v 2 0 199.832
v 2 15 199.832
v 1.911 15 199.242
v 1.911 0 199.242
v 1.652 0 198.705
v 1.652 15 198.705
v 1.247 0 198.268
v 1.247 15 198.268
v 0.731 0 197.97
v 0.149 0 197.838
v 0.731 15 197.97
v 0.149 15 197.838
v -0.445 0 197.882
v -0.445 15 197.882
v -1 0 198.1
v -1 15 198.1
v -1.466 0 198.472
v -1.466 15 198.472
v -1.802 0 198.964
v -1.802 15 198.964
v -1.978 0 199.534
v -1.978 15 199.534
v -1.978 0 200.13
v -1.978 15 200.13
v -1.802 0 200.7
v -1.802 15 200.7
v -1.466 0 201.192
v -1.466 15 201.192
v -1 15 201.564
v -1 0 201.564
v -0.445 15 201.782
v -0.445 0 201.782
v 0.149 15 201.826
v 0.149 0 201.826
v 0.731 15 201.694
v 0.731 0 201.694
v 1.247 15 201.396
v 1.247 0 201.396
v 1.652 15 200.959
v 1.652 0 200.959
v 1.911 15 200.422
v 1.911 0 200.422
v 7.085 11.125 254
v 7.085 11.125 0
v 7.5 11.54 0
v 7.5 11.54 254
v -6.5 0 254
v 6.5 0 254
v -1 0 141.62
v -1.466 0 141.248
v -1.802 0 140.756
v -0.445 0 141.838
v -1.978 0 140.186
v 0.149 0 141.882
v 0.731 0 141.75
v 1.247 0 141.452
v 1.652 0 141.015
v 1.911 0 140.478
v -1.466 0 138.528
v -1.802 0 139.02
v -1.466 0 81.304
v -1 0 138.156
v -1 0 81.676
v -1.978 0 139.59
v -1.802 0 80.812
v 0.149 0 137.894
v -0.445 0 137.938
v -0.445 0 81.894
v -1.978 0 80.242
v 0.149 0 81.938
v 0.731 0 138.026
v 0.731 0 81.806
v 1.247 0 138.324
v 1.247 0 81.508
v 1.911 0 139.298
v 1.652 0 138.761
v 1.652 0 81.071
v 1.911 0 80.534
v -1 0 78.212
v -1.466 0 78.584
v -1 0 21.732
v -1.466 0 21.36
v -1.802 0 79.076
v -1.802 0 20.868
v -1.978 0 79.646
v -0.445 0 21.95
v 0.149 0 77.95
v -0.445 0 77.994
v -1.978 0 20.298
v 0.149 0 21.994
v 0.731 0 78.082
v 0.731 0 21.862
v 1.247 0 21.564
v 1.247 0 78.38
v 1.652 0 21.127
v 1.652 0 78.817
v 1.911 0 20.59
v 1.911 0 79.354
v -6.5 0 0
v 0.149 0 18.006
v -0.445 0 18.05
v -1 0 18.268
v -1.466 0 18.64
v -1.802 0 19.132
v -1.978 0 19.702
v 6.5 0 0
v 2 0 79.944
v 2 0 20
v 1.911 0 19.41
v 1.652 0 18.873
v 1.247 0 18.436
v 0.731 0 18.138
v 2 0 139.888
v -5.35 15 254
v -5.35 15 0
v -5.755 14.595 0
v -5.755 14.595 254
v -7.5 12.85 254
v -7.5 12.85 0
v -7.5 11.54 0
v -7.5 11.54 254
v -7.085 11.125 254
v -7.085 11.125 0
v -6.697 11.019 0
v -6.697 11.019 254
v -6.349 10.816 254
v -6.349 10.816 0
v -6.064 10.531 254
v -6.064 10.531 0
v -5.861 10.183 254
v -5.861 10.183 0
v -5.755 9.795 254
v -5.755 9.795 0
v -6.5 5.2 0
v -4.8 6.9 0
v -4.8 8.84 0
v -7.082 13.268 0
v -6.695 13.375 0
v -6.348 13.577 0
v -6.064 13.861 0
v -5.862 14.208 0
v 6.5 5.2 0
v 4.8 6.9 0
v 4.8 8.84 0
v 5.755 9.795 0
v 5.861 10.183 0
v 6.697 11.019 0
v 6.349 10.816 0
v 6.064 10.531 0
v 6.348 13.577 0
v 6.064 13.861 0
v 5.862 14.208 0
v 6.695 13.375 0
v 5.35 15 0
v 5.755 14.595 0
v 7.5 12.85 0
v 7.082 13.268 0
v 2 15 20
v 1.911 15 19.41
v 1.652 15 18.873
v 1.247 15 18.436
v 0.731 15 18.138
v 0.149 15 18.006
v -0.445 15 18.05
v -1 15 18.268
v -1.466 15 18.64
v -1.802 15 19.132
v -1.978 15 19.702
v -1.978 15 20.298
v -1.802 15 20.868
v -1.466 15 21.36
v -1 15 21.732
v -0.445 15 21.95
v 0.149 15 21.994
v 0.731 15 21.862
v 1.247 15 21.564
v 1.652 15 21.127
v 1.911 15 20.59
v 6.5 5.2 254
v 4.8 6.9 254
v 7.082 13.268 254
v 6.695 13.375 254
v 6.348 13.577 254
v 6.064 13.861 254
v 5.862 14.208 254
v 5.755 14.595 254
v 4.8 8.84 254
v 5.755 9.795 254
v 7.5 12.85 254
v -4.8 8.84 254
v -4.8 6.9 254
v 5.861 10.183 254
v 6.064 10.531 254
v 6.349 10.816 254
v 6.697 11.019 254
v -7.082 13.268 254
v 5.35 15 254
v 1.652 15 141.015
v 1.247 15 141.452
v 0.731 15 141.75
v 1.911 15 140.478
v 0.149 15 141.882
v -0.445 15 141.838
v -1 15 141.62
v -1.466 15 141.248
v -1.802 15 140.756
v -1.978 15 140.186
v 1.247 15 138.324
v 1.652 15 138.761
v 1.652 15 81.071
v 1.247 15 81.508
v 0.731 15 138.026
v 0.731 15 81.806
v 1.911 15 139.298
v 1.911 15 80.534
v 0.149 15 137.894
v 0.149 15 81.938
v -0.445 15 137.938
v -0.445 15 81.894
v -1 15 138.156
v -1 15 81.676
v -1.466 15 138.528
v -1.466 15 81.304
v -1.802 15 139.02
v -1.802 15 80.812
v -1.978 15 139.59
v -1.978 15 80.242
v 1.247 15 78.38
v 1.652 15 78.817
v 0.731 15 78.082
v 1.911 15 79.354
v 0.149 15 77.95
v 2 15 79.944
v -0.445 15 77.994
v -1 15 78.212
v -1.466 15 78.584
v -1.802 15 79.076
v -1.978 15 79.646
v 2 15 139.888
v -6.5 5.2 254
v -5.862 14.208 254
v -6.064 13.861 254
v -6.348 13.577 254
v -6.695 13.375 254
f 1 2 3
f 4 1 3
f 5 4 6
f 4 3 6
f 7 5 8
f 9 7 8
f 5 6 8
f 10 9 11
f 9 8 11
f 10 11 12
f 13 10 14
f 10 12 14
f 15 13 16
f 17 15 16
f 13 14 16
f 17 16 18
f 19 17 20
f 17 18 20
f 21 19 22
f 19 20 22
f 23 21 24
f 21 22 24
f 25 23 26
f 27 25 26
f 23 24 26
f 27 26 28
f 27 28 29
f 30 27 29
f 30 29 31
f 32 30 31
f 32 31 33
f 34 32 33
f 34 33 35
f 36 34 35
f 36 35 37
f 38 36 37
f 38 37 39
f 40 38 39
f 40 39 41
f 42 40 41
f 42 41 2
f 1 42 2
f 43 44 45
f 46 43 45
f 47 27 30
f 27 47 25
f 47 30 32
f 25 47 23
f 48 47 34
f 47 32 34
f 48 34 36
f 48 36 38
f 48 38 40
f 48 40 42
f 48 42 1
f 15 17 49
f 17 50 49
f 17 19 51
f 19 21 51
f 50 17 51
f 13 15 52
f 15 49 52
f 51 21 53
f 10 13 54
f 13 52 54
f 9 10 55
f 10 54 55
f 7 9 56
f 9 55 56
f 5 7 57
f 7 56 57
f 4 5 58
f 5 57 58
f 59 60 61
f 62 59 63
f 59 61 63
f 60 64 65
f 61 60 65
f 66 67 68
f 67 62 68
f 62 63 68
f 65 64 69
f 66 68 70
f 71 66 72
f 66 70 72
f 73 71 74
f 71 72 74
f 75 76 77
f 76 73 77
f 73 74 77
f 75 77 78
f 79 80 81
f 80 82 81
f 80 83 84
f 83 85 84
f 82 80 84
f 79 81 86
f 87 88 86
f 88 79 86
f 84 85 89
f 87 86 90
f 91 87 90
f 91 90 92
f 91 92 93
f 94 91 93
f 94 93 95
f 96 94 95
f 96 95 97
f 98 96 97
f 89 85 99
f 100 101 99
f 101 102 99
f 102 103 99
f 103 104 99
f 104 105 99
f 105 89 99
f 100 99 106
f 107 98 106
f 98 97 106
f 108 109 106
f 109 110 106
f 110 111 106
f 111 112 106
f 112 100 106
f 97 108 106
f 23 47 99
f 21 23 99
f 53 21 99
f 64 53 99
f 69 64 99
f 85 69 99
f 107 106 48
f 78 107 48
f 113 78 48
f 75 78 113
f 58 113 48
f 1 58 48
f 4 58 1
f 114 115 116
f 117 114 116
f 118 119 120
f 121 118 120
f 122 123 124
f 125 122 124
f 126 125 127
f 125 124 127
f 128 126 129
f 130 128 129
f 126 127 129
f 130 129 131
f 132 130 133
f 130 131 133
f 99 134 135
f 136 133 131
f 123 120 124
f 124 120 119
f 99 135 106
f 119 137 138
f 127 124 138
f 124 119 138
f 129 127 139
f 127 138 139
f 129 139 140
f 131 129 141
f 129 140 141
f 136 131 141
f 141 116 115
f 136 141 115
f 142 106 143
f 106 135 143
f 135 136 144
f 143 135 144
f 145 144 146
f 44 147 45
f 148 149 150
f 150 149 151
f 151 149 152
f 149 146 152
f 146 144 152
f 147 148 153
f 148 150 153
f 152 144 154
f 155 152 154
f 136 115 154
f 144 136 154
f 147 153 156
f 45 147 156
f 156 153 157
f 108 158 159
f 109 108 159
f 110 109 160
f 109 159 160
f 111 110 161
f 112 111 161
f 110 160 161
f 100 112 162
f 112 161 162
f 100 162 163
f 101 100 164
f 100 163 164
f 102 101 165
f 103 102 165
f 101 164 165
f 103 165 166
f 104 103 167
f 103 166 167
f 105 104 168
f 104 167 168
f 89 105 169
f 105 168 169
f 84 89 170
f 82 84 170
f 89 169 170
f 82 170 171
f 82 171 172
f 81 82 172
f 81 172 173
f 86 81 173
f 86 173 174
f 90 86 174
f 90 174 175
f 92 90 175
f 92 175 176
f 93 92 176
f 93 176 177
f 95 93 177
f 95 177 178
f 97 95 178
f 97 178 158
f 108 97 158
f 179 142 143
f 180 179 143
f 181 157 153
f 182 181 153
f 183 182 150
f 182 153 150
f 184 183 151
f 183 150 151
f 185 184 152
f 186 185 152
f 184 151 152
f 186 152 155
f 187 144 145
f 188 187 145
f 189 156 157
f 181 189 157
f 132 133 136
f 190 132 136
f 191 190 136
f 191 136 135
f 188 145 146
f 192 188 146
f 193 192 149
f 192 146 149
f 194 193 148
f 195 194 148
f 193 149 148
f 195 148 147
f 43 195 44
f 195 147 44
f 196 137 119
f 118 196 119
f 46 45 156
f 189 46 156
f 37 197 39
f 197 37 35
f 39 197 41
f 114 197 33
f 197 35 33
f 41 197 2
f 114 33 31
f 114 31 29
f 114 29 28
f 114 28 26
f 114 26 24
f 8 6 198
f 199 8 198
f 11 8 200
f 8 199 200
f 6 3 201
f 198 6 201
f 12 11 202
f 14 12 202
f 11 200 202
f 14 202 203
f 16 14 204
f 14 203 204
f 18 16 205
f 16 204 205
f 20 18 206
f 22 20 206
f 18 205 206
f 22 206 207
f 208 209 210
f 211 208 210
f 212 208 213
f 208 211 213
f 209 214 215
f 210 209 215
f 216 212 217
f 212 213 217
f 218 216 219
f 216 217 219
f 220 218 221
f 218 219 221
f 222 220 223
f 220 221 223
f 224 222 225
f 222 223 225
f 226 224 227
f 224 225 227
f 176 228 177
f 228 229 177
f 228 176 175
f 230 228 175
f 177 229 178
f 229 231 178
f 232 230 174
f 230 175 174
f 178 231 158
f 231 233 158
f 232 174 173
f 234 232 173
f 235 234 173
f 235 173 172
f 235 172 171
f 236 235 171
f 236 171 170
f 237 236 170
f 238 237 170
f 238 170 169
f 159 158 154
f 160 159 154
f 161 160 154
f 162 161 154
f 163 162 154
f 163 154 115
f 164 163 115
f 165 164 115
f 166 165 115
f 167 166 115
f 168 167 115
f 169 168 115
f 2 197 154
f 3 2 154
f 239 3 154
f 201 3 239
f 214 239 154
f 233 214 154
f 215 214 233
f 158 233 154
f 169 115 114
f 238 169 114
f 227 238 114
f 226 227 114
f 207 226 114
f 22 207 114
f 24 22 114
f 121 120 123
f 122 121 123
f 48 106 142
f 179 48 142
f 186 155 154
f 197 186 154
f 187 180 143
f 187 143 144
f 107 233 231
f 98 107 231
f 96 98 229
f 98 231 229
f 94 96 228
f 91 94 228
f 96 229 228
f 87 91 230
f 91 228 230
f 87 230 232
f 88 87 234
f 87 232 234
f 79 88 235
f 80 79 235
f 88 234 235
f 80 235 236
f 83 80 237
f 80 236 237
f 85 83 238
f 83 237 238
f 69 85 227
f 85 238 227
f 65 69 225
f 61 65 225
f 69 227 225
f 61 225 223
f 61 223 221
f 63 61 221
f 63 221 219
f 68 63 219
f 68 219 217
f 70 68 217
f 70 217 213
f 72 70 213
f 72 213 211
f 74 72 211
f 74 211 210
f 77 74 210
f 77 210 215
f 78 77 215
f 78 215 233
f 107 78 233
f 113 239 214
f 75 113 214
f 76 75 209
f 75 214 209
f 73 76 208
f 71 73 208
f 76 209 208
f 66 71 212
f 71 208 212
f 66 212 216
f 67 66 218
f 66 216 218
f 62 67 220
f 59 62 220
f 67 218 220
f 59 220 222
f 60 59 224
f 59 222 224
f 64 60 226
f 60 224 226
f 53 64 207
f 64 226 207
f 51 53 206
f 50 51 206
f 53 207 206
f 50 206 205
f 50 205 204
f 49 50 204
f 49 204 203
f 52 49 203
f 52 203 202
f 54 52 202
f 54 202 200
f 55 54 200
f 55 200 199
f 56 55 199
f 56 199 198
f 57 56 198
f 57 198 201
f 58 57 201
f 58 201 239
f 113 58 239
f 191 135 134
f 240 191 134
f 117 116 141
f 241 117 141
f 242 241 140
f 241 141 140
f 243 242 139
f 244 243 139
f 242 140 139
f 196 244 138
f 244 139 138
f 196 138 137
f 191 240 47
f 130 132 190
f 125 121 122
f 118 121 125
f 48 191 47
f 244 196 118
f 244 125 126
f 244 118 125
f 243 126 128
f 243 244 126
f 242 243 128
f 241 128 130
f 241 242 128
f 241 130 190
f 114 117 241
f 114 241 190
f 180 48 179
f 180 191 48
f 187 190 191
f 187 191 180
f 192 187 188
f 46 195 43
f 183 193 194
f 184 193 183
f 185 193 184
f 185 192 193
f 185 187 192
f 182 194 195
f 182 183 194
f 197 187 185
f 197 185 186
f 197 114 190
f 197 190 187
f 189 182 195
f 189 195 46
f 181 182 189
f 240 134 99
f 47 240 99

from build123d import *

# Parameters (mm, degrees)
BOSS_EXTRUDE1_DEPTH = 254
SKETCH2_R           = 2
CUT_EXTRUDE1_DEPTH  = 16


with BuildPart() as part:
    # Sketch1 → Boss-Extrude1 (new body)
    with BuildSketch(Plane.XY):
        with BuildLine():
            Line((-6.5, 0), (6.5, 0))
            Line((6.5, 0), (6.5, 5.2))
            Line((6.5, 5.2), (4.8, 6.9))
            Line((4.8, 6.9), (4.8, 8.84))
            Line((4.8, 8.84), (5.754868434, 9.794868434))
            ThreePointArc((5.754868434, 9.794868434), (6.196913421, 10.683086579), (7.085131566, 11.125131566))
            Line((7.085131566, 11.125131566), (7.5, 11.54))
            Line((7.5, 11.54), (7.5, 12.85))
            Line((7.5, 12.85), (7.08164233, 13.26835767))
            ThreePointArc((7.08164233, 13.26835767), (6.196913421, 13.709913421), (5.75535767, 14.59464233))
            Line((5.75535767, 14.59464233), (5.35, 15))
            Line((5.35, 15), (-5.35, 15))
            Line((-5.35, 15), (-5.75535767, 14.59464233))
            ThreePointArc((-5.75535767, 14.59464233), (-6.196913421, 13.709913421), (-7.08164233, 13.26835767))
            Line((-7.08164233, 13.26835767), (-7.5, 12.85))
            Line((-7.5, 12.85), (-7.5, 11.54))
            Line((-7.5, 11.54), (-7.085131566, 11.125131566))
            ThreePointArc((-7.085131566, 11.125131566), (-6.196913421, 10.683086579), (-5.754868434, 9.794868434))
            Line((-5.754868434, 9.794868434), (-4.8, 8.84))
            Line((-4.8, 8.84), (-4.8, 6.9))
            Line((-4.8, 6.9), (-6.5, 5.2))
            Line((-6.5, 5.2), (-6.5, 0))
        make_face()
    extrude(amount=BOSS_EXTRUDE1_DEPTH)

    # Sketch2 → Cut-Extrude1 (cut, through all)
    with BuildSketch(Plane(origin=(0, 15, 0), x_dir=(1, 0, 0), z_dir=(0, 1, 0))):
        with Locations((0, -20)):
            Circle(SKETCH2_R)
        with Locations((0, -79.944)):
            Circle(SKETCH2_R)
        with Locations((0, -139.888)):
            Circle(SKETCH2_R)
        with Locations((0, -199.832)):
            Circle(SKETCH2_R)
    extrude(amount=-CUT_EXTRUDE1_DEPTH, mode=Mode.SUBTRACT)


solid = part.part
